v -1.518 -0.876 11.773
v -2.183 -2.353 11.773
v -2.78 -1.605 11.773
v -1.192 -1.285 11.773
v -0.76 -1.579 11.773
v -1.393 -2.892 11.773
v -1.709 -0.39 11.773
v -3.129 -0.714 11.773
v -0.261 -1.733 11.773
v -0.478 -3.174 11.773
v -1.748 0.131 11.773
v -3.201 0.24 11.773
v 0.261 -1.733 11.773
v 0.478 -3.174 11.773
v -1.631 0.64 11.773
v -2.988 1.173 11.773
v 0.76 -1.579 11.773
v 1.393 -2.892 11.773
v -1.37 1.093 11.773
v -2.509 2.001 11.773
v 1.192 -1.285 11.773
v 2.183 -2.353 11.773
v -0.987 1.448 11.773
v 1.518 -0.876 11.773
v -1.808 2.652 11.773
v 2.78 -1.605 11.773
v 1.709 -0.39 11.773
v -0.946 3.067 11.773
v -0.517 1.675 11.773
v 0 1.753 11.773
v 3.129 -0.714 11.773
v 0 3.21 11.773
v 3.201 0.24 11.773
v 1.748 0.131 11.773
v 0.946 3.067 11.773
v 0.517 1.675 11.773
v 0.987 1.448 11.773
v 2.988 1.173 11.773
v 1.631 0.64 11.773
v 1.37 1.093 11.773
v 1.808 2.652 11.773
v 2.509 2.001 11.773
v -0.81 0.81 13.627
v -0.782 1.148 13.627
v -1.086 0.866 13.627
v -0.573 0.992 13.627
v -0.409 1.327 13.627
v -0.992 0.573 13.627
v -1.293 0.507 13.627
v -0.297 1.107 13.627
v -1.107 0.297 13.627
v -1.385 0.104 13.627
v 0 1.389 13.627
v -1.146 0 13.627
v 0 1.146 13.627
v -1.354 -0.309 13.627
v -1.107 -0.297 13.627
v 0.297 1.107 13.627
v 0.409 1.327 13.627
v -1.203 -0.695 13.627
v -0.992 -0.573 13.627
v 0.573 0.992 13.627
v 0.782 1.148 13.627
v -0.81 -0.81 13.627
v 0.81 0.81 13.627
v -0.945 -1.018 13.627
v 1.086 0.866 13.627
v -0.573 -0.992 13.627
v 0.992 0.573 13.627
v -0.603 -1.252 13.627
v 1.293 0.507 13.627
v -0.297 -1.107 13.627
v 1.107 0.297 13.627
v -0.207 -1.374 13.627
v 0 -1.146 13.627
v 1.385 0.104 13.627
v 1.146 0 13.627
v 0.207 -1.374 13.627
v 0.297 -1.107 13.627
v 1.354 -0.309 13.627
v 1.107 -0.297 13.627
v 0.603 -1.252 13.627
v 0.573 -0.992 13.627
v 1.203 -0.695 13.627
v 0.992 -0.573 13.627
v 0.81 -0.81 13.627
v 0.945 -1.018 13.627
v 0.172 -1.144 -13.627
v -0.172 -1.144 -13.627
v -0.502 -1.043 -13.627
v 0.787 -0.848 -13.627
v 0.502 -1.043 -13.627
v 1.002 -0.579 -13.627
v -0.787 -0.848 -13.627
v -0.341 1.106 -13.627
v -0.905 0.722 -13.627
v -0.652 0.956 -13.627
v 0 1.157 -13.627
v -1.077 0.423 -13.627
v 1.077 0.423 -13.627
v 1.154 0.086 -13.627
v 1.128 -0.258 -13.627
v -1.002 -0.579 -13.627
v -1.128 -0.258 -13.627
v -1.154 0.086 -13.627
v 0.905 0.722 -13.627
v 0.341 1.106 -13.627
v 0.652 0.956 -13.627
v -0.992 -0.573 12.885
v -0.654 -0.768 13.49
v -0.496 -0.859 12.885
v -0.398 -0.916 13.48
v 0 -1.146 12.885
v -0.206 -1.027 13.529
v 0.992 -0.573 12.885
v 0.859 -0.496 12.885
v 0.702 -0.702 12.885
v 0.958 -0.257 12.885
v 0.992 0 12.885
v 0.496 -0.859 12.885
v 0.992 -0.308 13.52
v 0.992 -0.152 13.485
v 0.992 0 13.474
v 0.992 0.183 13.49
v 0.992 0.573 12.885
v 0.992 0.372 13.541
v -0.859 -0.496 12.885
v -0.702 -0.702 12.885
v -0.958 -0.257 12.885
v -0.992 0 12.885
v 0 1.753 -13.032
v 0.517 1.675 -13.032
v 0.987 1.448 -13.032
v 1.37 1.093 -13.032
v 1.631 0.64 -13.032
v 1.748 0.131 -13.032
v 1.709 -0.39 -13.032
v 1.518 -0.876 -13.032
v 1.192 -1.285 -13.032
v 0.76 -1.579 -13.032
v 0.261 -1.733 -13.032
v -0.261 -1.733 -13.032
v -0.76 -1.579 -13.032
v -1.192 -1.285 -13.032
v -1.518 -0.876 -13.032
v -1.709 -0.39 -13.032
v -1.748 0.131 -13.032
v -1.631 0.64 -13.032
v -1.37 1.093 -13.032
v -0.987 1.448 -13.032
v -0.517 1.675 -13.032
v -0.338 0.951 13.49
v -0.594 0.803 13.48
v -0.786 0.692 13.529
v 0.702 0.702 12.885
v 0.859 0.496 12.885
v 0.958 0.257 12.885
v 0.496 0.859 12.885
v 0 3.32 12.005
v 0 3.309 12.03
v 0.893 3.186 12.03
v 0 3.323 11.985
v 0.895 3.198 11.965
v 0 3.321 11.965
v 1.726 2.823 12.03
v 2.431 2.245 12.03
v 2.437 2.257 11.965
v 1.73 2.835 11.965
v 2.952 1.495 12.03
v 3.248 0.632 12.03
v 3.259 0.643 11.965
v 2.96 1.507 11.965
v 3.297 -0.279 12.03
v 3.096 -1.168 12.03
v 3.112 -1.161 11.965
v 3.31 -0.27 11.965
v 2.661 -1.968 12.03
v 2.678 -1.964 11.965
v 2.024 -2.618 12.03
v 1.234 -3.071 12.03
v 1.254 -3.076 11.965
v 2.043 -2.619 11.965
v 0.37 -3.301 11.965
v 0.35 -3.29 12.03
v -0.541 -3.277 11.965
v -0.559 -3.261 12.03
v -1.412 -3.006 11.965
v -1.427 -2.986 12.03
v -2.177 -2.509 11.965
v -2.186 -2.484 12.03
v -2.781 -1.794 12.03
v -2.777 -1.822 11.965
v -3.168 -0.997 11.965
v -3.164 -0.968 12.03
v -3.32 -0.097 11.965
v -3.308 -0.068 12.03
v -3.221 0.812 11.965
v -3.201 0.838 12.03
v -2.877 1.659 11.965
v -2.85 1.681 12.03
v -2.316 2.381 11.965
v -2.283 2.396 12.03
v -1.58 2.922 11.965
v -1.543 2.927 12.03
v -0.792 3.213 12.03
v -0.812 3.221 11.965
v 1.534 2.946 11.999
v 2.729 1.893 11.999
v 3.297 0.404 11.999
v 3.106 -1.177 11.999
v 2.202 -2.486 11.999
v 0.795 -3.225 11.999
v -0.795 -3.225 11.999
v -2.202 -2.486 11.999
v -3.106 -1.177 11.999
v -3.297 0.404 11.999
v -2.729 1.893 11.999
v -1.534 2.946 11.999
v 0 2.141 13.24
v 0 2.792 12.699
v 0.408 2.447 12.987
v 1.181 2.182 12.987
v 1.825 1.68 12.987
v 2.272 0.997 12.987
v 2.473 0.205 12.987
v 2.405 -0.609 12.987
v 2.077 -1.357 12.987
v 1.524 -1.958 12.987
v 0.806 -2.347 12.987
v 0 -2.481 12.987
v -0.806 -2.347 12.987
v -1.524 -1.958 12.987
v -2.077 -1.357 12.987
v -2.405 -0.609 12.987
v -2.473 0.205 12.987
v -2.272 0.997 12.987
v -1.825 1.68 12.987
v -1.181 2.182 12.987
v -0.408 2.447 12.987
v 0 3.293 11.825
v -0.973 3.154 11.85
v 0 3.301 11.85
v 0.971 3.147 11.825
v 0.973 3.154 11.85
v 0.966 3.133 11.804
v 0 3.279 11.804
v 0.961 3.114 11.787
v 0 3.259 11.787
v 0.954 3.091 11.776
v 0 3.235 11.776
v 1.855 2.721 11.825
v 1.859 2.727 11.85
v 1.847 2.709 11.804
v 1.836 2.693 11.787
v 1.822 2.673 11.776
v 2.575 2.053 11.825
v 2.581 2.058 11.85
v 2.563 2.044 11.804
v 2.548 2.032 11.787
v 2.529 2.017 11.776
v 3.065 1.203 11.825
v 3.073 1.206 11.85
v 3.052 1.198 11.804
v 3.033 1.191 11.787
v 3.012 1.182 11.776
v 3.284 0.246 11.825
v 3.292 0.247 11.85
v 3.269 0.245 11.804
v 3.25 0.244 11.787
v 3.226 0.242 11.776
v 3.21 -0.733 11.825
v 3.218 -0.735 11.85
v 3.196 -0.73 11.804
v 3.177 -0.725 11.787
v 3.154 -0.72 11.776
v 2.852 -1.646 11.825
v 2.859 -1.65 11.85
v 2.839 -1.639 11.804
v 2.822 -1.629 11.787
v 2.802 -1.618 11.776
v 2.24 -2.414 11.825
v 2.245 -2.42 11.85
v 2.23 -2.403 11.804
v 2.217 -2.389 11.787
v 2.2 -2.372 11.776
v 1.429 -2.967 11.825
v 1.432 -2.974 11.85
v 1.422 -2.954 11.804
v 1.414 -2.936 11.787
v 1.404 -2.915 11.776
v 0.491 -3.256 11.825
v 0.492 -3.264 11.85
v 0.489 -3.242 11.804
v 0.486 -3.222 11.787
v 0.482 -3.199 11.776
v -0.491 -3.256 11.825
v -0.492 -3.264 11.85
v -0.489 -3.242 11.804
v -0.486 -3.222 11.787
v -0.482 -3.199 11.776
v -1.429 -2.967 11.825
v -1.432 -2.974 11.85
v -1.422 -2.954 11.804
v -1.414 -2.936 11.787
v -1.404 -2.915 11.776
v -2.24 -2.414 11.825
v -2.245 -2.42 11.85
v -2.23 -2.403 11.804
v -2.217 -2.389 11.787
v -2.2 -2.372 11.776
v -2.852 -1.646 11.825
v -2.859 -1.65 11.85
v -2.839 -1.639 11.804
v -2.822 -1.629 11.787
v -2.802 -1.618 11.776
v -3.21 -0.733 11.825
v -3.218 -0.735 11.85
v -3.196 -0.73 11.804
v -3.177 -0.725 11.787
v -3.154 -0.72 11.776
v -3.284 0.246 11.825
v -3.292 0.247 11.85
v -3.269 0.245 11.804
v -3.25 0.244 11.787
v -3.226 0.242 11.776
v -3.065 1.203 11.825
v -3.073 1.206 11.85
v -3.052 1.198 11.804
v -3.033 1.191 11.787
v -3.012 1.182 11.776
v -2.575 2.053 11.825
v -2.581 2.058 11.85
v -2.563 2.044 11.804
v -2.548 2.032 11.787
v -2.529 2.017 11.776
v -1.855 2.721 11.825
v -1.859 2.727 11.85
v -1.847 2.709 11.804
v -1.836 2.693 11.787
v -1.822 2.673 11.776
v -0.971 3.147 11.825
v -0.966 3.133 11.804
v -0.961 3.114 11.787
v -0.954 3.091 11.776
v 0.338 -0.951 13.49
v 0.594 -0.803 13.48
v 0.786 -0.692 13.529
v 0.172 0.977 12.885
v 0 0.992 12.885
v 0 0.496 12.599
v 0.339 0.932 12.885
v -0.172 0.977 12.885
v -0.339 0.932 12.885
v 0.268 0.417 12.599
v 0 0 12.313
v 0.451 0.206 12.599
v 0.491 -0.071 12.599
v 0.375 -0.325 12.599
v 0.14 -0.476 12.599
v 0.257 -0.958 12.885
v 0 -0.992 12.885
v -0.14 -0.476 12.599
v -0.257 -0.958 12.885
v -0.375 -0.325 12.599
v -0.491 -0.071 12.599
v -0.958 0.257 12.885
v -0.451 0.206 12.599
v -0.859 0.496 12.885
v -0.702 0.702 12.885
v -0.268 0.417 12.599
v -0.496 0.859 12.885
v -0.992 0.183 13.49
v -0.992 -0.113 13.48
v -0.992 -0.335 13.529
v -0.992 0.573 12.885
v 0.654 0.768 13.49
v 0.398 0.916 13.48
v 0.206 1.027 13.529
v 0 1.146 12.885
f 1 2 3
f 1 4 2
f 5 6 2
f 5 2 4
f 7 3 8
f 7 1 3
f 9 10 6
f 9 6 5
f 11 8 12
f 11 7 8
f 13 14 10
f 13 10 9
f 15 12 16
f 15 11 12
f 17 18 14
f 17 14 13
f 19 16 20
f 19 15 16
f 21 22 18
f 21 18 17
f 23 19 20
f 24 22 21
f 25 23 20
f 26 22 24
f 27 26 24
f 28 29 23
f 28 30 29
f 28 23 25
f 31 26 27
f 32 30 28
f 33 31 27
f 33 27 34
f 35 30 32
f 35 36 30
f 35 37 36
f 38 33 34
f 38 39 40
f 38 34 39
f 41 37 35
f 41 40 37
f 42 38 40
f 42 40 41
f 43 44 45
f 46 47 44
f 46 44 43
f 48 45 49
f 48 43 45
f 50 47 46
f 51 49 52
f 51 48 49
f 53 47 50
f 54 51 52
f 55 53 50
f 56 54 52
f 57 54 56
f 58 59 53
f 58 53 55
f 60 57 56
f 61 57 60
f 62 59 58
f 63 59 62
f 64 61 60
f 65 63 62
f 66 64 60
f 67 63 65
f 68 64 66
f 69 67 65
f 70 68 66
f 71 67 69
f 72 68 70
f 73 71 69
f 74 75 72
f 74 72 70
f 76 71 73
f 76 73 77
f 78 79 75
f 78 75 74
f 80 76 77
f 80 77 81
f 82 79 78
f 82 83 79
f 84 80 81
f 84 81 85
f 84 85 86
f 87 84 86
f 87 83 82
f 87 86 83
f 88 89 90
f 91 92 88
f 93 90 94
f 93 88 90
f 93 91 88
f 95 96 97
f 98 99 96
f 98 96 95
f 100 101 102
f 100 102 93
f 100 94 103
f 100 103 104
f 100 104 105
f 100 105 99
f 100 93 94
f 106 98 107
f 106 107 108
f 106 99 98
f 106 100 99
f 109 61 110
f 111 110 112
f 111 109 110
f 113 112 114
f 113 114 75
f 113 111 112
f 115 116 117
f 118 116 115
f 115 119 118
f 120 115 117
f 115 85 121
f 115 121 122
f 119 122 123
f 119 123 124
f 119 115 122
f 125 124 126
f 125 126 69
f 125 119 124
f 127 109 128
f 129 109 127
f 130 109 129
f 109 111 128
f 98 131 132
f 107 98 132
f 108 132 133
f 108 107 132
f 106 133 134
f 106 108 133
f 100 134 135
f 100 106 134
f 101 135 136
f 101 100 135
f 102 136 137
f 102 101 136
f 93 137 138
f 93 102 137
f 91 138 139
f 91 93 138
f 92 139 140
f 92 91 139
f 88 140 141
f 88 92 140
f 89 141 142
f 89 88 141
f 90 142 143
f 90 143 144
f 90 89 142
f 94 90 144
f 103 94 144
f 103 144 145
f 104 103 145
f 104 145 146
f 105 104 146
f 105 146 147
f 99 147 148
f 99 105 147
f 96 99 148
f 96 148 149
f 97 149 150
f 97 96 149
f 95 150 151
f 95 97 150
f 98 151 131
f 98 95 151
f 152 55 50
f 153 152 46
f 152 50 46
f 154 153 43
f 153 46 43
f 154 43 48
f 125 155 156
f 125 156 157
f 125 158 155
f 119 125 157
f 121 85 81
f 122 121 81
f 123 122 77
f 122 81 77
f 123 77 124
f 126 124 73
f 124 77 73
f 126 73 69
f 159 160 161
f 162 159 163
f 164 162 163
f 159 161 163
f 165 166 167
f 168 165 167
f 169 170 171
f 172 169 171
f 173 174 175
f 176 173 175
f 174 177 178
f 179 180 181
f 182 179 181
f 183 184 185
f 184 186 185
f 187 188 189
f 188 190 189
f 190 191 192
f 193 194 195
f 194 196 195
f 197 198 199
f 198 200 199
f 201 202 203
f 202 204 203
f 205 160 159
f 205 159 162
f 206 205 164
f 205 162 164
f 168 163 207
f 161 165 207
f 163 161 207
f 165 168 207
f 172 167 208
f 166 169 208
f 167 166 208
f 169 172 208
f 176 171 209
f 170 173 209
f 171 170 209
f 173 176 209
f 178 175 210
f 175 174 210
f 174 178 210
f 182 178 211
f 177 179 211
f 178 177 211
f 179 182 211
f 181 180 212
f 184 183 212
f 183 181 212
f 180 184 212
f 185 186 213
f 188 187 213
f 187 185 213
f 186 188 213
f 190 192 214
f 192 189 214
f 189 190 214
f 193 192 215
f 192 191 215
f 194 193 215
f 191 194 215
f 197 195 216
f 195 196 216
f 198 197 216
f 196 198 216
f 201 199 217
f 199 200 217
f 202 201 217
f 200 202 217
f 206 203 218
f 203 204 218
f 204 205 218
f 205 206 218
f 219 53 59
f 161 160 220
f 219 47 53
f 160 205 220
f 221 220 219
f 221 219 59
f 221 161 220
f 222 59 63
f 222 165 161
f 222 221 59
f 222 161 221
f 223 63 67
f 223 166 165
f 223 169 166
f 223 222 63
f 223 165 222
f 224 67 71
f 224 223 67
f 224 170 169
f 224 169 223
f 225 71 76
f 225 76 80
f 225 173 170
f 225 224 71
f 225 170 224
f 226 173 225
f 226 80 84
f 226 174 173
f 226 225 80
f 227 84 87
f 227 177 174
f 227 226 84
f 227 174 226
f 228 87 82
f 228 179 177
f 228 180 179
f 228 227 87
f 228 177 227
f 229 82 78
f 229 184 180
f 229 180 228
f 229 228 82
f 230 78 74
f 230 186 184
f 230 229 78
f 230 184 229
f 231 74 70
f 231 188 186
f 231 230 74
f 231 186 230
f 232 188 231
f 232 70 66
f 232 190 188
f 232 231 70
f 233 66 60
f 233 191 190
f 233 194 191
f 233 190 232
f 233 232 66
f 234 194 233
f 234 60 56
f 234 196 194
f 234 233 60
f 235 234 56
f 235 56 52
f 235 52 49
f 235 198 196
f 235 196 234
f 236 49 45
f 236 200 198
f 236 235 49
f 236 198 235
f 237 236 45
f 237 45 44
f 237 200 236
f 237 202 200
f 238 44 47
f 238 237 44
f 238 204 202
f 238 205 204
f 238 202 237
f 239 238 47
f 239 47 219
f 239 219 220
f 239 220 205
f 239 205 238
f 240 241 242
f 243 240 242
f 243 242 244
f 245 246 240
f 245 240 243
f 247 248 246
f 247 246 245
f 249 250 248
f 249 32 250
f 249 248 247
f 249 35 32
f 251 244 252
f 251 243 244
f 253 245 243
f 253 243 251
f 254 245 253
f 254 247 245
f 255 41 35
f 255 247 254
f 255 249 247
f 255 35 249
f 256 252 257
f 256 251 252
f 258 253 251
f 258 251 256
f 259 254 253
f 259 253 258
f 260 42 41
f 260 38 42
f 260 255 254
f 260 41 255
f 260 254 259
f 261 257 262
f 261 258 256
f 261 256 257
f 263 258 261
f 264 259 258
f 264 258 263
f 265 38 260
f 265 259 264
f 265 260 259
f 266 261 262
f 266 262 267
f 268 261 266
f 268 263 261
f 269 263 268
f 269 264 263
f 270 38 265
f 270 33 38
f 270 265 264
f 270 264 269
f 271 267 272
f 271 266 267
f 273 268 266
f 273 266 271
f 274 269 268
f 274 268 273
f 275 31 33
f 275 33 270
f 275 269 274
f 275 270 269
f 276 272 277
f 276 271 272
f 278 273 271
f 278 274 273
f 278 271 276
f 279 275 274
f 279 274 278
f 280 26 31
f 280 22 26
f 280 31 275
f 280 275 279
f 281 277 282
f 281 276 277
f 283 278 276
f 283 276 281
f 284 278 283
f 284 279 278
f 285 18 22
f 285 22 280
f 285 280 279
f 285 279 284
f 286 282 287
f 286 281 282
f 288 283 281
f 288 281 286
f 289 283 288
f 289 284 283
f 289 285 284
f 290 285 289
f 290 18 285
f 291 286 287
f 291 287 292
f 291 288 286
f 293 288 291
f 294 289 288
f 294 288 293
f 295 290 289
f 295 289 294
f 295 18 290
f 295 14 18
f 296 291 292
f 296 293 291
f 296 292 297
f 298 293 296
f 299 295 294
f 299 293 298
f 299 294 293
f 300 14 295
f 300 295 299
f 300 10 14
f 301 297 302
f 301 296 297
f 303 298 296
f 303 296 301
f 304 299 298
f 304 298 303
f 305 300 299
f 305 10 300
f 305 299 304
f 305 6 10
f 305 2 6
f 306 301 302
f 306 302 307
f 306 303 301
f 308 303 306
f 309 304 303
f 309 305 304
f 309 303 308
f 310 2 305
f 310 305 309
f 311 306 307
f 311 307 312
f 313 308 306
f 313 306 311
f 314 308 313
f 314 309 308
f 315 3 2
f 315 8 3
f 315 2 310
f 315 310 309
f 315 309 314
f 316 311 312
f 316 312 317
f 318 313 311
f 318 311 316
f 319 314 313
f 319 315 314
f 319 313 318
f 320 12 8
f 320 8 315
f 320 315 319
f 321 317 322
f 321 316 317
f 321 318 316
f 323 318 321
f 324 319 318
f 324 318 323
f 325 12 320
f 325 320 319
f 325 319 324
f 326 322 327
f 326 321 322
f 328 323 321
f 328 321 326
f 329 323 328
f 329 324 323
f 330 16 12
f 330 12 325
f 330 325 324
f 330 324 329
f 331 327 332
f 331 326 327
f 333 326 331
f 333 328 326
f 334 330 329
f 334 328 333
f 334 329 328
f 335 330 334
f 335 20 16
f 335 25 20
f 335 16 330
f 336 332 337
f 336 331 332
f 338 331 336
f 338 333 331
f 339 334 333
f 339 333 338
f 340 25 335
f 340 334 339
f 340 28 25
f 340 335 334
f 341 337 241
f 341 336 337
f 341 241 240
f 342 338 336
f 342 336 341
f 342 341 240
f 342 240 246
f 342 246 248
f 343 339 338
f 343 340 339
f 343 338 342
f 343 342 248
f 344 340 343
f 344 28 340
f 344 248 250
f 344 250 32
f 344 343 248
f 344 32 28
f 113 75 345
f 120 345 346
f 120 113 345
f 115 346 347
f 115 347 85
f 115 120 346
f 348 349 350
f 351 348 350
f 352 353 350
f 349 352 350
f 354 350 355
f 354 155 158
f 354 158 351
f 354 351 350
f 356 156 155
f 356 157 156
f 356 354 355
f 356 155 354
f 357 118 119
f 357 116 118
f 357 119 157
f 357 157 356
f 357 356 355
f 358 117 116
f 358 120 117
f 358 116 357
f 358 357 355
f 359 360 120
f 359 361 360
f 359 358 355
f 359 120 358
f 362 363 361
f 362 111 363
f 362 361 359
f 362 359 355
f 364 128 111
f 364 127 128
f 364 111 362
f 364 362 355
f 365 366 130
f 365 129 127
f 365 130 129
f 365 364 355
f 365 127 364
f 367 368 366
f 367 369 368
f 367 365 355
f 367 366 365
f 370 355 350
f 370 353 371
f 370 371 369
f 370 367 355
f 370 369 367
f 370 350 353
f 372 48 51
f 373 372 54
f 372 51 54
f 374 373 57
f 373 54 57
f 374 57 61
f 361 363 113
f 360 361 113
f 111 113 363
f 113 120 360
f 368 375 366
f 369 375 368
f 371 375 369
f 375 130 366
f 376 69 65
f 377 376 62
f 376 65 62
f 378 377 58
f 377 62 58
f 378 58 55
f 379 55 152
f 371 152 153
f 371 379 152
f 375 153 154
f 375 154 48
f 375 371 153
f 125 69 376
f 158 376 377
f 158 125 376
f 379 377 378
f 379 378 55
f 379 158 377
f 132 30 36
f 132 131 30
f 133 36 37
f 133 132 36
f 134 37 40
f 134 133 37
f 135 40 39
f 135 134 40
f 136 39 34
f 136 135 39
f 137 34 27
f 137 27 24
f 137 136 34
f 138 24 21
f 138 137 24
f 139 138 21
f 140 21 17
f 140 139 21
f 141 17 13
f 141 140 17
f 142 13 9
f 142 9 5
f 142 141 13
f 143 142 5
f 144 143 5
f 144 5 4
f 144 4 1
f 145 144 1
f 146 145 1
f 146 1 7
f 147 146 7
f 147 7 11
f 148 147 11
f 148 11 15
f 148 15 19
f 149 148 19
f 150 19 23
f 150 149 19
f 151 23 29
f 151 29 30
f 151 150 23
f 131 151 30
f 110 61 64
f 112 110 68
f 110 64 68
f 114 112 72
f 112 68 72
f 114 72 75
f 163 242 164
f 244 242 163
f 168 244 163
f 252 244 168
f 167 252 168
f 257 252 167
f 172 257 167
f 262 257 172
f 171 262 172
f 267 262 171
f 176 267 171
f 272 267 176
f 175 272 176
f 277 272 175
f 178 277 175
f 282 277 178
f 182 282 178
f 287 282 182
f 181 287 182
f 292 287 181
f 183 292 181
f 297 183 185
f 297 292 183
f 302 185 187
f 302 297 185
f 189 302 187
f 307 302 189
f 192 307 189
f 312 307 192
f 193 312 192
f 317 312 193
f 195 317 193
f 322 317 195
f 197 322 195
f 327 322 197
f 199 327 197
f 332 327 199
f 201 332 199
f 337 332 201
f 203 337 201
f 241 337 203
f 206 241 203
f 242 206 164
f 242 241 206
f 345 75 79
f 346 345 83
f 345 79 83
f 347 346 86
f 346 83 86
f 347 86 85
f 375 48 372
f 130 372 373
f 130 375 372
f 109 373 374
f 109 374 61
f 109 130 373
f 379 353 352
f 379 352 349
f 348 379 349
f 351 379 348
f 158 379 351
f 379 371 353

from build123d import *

# Parameters (mm, degrees)
CUT_EXTRUDE1_START = 12.88542
CUT_EXTRUDE1_DEPTH = 1.74168
SKETCH4_R          = 1.14567944
CUT_EXTRUDE2_DEPTH = 0.74168
CUT_EXTRUDE2_DRAFT = -45
FILLET1_R          = 0.09271


with BuildPart() as part:
    # Sketch2 → Revolve1 (revolve)
    with BuildSketch(Plane(origin=(0, 0, 0), x_dir=(0, 0, -1), z_dir=(1, 0, 0))):
        with BuildLine():
            Line((-13.6271, 0.9921875), (-13.6271, 1.3890625))
            ThreePointArc((-13.6271, 1.3890625), (-12.975897643, 2.494669105), (-11.999685714, 3.3274))
            Line((-11.999685714, 3.3274), (-11.7729, 3.28741156))
            Line((-11.7729, 3.28741156), (-11.7729, 1.7526))
            Line((-11.7729, 1.7526), (13.0317875, 1.7526))
            Line((13.0317875, 1.7526), (13.6271, 1.1572875))
            Line((13.6271, 1.1572875), (13.6271, 0))
            Line((13.6271, 0), (-12.31258028, 0))
            Line((-12.31258028, 0), (-12.88542, 0.9921875))
            Line((-12.88542, 0.9921875), (-13.6271, 0.9921875))
        make_face()
    revolve(axis=Axis((0, 0, 13.6271), (0, 0, -1)))

    # Sketch3 → Cut-Extrude1 (cut, through all)
    with BuildSketch(Plane.XY.offset(CUT_EXTRUDE1_START)):
        Polygon((0, 1.14567944), (-0.9921875, 0.57283972), (-0.9921875, -0.57283972), (0, -1.14567944), (0.9921875, -0.57283972), (0.9921875, 0.57283972), align=None)
    extrude(amount=CUT_EXTRUDE1_DEPTH, mode=Mode.SUBTRACT)


with BuildPart() as cut_extrude2_tool:
    # Sketch4 → Cut-Extrude2 (with draft: the straight prism first)
    with BuildSketch(Plane.XY.offset(13.6271)):
        Circle(SKETCH4_R)
    extrude(amount=-CUT_EXTRUDE2_DEPTH)
    # Cut-Extrude2: the draft: its side faces are tilted about the plane it starts from
    cut_extrude2_sides = [cut_extrude2_tool.faces().sort_by_distance(p)[0] for p in [
        (-1.14567944, 0, 13.25626),
    ]]
    draft(cut_extrude2_sides, Plane.XY.offset(13.6271), CUT_EXTRUDE2_DRAFT)


with BuildPart() as part_1:
    add(part.part)

    # Cut-Extrude2: cut by cut_extrude2_tool
    add(cut_extrude2_tool.part, mode=Mode.SUBTRACT)

    # Fillet1
    fillet1_edges = [part_1.edges().sort_by_distance(p)[0] for p in [
        (0, -3.28741156, 11.7729),
        (0, -3.3274, 11.999685714),
    ]]
    fillet(fillet1_edges, radius=FILLET1_R)


solid = part_1.part
